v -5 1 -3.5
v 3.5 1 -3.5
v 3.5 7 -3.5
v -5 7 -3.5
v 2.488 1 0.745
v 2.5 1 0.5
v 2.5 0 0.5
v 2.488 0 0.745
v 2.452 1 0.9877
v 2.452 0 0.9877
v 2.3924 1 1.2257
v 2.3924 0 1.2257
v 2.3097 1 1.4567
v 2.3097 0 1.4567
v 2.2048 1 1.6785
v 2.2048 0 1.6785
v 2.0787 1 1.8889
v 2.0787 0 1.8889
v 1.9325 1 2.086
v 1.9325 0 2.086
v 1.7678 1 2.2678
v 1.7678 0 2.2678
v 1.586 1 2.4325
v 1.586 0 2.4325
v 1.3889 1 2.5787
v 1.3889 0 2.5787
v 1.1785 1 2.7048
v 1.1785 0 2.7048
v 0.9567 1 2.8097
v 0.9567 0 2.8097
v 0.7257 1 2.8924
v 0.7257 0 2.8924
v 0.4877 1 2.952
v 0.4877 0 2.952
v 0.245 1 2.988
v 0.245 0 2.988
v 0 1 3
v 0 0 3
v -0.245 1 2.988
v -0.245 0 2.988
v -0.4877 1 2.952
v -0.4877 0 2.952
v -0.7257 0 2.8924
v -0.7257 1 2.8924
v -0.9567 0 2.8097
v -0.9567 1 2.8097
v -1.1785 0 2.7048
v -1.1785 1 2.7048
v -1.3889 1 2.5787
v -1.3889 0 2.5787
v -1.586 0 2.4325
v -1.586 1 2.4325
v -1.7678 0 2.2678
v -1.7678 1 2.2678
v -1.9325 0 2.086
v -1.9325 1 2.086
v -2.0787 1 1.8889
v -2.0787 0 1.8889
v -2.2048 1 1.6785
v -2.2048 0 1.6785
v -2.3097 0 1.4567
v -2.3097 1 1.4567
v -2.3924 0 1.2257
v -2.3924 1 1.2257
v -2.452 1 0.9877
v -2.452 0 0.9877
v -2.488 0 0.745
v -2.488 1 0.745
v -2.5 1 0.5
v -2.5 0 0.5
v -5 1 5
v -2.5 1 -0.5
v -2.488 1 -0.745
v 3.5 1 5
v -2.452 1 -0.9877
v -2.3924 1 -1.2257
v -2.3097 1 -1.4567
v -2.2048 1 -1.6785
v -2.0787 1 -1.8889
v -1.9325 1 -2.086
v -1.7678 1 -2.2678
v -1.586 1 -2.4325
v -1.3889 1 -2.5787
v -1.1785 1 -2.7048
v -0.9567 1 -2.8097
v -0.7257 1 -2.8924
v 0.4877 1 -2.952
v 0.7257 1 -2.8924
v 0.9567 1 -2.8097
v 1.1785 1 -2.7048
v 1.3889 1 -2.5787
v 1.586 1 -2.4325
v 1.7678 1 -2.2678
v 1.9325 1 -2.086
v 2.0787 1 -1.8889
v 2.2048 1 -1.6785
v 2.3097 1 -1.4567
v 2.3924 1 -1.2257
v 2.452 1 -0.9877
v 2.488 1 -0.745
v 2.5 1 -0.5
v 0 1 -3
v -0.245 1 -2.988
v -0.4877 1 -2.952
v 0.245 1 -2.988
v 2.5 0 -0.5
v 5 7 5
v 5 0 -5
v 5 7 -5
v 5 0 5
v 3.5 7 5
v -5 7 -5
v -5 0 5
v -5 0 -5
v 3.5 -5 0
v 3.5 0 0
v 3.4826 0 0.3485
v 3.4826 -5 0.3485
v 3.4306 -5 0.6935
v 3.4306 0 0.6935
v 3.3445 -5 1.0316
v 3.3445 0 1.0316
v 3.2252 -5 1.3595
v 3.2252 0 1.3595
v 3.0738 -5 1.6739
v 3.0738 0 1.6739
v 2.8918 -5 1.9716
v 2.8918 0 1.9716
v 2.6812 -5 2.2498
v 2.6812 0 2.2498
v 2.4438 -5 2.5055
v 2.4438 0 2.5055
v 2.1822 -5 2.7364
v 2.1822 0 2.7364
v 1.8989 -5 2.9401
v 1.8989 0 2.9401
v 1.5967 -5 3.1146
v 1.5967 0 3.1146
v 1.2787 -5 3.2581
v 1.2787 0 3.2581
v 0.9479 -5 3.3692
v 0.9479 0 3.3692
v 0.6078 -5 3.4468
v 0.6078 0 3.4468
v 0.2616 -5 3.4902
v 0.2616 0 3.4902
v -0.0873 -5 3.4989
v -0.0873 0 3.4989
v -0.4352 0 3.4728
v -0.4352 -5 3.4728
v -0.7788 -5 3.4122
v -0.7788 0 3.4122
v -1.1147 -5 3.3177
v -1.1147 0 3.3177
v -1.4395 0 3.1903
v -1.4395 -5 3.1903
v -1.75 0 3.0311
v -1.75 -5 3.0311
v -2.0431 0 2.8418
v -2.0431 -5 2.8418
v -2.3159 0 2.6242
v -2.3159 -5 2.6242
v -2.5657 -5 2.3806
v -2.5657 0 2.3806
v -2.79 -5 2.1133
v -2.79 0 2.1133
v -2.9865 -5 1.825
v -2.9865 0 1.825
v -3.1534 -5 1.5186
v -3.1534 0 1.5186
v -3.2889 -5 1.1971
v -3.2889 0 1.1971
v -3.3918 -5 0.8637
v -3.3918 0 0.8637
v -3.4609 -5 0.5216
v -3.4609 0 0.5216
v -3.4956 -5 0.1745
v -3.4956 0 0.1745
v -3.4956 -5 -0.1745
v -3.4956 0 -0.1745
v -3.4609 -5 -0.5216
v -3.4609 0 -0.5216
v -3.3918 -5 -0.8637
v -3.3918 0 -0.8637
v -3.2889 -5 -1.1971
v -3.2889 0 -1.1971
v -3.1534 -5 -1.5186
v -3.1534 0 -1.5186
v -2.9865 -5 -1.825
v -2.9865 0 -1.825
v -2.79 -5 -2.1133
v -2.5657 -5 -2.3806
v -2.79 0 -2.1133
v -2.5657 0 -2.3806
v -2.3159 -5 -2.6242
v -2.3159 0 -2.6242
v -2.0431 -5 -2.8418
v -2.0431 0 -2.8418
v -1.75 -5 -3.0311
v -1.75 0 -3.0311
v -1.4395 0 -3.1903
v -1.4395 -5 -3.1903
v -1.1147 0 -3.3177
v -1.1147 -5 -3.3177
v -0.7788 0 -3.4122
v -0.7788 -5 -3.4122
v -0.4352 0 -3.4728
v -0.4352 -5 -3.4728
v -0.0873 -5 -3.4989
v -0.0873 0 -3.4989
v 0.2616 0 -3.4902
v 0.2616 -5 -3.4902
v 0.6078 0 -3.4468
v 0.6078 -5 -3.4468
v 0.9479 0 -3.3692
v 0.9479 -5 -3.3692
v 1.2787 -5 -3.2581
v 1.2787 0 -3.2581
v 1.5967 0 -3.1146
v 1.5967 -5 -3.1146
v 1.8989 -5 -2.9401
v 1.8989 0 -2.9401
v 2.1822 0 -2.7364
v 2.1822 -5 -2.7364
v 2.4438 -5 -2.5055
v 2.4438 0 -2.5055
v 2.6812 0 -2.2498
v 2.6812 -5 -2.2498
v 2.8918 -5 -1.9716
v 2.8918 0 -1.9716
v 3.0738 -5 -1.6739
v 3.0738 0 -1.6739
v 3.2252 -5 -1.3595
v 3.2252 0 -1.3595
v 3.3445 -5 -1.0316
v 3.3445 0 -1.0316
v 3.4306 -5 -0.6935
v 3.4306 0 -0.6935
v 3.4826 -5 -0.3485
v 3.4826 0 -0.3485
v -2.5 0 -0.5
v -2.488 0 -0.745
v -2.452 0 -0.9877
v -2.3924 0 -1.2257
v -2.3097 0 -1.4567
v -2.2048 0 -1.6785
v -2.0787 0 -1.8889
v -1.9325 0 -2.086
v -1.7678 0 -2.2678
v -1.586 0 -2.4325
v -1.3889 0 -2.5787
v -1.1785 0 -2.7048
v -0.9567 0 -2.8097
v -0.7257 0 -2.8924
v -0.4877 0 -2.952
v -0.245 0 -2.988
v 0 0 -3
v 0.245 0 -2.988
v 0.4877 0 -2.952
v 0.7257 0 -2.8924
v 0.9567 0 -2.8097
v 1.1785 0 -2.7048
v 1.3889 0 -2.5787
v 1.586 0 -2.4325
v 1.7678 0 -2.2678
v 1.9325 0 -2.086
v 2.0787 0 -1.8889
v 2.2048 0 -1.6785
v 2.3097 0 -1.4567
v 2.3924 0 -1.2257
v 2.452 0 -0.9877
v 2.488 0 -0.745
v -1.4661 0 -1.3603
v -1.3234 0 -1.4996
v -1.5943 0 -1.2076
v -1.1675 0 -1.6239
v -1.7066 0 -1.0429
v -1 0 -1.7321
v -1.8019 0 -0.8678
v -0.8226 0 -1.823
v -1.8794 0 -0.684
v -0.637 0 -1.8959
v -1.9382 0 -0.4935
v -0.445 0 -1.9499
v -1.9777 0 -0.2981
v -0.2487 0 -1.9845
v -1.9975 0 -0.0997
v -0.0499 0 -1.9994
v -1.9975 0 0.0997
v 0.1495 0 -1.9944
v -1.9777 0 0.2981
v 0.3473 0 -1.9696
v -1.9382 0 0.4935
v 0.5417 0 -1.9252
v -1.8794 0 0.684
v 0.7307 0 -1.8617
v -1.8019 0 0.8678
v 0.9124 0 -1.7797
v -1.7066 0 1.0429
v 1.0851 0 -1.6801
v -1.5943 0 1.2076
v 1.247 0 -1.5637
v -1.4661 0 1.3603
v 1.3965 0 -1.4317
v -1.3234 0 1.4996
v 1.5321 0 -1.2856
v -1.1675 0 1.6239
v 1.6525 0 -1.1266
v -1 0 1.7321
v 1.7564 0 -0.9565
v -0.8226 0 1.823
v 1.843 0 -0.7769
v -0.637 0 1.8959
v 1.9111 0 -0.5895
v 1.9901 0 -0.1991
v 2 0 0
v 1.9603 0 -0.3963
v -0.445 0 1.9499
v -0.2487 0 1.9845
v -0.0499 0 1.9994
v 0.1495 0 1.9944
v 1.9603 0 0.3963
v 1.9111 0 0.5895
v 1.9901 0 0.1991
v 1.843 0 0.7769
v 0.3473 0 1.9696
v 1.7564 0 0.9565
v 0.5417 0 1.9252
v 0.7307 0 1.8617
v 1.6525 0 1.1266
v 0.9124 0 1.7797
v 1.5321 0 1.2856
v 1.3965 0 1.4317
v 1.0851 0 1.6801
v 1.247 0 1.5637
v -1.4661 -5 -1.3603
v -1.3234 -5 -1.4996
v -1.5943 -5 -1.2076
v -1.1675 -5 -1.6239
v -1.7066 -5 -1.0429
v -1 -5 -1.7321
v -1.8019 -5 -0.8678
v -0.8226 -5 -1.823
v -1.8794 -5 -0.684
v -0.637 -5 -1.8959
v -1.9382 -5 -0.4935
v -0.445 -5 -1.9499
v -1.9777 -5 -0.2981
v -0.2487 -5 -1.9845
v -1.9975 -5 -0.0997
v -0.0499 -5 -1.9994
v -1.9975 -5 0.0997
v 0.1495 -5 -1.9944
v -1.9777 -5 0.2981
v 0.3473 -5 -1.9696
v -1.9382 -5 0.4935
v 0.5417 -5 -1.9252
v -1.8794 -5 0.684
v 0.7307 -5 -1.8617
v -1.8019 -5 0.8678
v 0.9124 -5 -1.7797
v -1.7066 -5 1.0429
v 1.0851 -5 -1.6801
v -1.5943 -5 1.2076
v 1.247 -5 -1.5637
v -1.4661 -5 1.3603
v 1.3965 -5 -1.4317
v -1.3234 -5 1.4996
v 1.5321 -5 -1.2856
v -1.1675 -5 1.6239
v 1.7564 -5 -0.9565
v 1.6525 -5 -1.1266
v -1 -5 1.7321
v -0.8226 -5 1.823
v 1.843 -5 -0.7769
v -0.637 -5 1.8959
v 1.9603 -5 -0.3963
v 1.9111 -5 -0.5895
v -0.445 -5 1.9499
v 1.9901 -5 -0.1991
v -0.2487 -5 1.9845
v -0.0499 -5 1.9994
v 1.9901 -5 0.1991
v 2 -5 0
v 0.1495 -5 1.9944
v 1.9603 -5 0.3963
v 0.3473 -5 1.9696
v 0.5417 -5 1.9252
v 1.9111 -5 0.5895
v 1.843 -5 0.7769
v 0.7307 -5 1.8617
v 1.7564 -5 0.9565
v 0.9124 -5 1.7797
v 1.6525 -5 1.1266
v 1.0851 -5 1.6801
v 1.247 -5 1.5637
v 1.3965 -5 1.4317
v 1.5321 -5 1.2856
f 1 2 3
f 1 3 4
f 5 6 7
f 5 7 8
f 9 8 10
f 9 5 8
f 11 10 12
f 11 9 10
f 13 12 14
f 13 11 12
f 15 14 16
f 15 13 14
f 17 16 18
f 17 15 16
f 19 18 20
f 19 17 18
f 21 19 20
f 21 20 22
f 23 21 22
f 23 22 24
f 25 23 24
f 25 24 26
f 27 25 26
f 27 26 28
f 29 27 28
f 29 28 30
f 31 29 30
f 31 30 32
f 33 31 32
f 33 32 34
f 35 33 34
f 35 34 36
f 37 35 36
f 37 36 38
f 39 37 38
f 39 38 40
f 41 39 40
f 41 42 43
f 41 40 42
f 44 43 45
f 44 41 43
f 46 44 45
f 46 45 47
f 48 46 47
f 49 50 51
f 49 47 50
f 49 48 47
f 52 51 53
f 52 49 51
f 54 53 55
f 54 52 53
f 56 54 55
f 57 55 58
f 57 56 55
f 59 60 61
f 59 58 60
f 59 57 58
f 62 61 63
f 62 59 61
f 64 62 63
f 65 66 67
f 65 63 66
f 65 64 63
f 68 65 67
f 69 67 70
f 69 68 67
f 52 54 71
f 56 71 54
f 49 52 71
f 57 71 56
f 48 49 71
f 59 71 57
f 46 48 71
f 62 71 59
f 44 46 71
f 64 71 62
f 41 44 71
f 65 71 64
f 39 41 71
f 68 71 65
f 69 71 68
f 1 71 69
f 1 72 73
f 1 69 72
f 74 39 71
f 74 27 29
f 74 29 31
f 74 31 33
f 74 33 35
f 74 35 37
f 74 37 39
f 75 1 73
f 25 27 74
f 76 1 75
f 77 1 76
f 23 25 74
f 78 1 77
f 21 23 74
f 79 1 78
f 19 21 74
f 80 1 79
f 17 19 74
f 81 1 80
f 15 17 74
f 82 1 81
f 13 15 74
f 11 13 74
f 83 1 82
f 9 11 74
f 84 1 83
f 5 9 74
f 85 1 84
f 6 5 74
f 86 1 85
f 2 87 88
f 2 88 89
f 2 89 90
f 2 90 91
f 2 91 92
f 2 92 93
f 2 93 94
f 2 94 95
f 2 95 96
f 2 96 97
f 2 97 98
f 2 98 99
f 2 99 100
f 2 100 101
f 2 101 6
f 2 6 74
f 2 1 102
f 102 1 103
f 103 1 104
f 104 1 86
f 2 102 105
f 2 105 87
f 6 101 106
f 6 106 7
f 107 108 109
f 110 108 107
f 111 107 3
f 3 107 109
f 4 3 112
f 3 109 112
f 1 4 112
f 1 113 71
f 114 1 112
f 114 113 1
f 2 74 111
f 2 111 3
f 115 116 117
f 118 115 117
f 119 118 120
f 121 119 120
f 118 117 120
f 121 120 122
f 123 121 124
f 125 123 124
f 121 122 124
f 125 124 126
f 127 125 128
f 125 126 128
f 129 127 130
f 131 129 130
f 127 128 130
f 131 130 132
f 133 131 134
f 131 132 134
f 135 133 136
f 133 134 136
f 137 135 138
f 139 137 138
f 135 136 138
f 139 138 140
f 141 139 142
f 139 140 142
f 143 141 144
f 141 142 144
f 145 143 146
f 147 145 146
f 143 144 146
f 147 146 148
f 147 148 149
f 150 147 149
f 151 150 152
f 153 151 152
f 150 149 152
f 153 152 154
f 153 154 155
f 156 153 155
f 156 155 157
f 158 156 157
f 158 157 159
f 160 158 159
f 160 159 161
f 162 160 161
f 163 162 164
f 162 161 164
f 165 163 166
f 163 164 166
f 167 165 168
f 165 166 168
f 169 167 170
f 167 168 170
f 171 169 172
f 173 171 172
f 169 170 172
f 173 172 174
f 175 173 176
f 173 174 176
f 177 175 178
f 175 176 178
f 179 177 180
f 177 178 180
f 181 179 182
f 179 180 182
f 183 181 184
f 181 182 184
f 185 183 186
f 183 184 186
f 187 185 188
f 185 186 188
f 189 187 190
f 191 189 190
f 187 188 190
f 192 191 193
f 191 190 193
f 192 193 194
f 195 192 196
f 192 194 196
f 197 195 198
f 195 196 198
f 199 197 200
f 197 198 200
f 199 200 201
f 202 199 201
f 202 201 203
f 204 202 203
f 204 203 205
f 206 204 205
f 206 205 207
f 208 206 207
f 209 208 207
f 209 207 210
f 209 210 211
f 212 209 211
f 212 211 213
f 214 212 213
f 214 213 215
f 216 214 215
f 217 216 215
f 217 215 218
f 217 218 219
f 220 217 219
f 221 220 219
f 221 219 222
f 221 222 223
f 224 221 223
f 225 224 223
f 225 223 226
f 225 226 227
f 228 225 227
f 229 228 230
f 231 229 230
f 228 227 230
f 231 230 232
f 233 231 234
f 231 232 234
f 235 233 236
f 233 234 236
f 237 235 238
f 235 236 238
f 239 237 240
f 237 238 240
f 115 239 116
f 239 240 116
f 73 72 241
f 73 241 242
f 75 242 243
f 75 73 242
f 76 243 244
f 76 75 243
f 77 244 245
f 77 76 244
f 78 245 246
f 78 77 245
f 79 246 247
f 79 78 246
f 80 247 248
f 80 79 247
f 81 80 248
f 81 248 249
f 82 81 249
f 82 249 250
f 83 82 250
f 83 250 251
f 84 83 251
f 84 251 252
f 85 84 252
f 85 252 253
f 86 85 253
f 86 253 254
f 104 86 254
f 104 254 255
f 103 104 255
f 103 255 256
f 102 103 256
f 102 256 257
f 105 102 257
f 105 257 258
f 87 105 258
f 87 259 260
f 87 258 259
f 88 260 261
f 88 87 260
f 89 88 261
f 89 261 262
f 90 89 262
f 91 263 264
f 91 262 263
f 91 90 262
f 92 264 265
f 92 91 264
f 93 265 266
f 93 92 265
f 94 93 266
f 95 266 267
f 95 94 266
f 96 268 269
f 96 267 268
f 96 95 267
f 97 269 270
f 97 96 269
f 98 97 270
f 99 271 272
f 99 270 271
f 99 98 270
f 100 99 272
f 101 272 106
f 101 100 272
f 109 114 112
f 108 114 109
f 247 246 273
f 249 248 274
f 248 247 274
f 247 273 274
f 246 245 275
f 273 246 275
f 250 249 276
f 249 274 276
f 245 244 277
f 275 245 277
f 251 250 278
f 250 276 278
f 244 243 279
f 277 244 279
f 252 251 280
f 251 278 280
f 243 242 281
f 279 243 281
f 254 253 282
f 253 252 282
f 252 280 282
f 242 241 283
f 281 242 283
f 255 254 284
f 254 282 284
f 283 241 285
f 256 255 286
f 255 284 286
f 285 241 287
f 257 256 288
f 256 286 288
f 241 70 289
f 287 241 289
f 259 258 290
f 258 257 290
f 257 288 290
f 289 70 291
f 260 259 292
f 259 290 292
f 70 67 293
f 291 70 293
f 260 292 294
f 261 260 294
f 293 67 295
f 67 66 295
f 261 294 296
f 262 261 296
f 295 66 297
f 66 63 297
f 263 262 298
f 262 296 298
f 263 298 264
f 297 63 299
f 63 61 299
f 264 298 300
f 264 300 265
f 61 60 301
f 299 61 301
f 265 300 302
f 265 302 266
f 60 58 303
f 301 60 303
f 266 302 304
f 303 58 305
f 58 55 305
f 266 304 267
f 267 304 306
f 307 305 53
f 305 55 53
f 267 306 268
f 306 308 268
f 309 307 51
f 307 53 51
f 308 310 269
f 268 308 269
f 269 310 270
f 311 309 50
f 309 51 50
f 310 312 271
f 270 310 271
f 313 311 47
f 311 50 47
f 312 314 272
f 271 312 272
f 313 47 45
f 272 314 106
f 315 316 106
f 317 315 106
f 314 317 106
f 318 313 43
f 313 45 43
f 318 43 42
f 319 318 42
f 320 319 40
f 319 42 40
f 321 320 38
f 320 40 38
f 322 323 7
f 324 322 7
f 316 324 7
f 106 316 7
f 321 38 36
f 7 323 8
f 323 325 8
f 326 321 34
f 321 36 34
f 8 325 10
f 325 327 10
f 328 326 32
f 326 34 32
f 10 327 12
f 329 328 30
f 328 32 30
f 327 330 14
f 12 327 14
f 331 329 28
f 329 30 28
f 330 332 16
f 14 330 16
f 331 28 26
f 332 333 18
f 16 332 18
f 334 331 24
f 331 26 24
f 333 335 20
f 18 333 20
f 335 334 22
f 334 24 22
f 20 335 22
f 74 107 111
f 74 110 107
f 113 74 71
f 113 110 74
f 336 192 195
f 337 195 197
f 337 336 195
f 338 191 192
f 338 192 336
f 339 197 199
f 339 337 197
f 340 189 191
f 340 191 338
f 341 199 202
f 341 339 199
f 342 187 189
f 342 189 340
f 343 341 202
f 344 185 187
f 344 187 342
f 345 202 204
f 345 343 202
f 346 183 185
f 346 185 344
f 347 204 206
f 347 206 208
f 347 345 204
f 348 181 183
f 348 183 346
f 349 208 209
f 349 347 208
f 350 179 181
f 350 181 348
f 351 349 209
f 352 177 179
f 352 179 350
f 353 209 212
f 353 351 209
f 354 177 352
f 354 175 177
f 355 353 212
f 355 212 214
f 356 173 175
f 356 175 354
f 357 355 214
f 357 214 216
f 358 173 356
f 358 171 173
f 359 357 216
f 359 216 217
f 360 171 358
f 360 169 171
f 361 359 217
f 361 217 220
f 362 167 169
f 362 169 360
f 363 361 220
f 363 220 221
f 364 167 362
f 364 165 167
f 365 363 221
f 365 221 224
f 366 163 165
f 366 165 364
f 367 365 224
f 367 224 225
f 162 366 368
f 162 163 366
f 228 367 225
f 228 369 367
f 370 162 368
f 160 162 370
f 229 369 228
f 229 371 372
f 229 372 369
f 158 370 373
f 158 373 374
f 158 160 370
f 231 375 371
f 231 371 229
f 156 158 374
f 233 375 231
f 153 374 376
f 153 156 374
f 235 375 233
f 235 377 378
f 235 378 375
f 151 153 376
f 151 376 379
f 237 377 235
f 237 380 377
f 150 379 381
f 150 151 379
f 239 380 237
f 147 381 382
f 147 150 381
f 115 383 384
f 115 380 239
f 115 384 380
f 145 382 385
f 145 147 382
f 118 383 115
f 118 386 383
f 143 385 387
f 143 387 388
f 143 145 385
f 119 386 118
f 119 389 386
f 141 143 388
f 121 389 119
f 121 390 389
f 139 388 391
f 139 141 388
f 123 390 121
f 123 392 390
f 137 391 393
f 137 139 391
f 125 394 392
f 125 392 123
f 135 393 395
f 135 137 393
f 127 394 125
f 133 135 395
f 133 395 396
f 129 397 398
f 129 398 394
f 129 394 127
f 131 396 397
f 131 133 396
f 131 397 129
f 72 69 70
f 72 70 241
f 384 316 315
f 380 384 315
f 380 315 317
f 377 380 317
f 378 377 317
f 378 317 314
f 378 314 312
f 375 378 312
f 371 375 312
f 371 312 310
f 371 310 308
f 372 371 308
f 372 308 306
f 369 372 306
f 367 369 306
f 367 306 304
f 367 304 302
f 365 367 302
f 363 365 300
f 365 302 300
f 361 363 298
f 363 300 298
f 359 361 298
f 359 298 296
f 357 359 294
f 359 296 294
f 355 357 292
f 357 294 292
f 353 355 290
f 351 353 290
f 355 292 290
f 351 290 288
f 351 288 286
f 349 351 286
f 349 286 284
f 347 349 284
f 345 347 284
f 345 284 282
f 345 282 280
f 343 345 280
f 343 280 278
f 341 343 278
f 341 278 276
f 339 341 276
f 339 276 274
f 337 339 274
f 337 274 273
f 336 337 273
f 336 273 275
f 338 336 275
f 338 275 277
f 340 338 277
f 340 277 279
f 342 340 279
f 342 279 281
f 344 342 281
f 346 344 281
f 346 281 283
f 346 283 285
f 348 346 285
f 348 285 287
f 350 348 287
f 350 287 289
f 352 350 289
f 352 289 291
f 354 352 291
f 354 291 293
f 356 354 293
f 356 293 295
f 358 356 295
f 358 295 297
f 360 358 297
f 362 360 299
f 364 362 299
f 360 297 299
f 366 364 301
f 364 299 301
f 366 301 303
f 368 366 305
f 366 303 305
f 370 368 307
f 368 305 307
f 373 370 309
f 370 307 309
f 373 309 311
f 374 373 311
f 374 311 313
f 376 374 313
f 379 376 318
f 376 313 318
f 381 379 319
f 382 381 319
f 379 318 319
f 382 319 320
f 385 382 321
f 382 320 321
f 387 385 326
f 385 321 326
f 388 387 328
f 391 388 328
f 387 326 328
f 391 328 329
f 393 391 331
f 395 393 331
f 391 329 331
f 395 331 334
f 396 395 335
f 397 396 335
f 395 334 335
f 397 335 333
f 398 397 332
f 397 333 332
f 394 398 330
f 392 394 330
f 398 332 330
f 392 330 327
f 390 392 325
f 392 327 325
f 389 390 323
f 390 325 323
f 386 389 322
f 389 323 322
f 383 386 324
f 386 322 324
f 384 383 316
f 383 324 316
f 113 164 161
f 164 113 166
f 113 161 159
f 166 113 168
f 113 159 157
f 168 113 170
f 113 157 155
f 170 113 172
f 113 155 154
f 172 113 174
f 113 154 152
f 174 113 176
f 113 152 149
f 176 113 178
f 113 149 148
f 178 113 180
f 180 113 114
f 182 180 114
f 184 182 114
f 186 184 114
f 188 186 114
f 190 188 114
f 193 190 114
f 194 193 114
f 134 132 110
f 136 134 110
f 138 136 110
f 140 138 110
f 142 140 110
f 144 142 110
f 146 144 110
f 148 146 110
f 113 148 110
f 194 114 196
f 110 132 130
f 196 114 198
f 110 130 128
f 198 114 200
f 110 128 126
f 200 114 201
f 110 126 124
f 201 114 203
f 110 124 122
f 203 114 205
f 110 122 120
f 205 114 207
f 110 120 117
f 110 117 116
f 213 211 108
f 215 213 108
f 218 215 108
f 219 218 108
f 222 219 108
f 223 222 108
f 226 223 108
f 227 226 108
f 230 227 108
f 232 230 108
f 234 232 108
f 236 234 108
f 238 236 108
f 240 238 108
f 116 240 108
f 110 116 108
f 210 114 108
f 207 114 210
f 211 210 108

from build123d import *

# Parameters (mm, degrees)
SKETCH1_W           = 10
SKETCH1_H           = 10
BOSS_EXTRUDE1_DEPTH = 1
CUT_EXTRUDE1_DEPTH  = 1.5
SKETCH3_R           = 3.5
BOSS_EXTRUDE2_DEPTH = 5
SKETCH4_R           = 2
CUT_EXTRUDE2_DEPTH  = 6
BOSS_EXTRUDE3_DEPTH = 6


with BuildPart() as part:
    # Sketch1 → Boss-Extrude1 (new body)
    with BuildSketch(Plane(origin=(0, 0, 0), x_dir=(1, 0, 0), z_dir=(0, 1, 0))):
        Rectangle(SKETCH1_W, SKETCH1_H)
    extrude(amount=BOSS_EXTRUDE1_DEPTH)

    # Sketch2 → Cut-Extrude1 (cut)
    with BuildSketch(Plane(origin=(0, 1, 0), x_dir=(1, 0, 0), z_dir=(0, 1, 0))):
        with BuildLine():
            Line((2.5, 0.5), (2.5, -0.5))
            ThreePointArc((2.5, -0.5), (0, -3), (-2.5, -0.5))
            Line((-2.5, -0.5), (-2.5, 0.5))
            ThreePointArc((-2.5, 0.5), (0, 3), (2.5, 0.5))
        make_face()
    extrude(amount=-CUT_EXTRUDE1_DEPTH, mode=Mode.SUBTRACT)

    # Sketch3 → Boss-Extrude2 (add)
    with BuildSketch(Plane.XZ):
        Circle(SKETCH3_R)
    extrude(amount=BOSS_EXTRUDE2_DEPTH)

    # Sketch4 → Cut-Extrude2 (cut, through all)
    with BuildSketch(Plane(origin=(0, 0, 0), x_dir=(1, 0, 0), z_dir=(0, 1, 0))):
        Circle(SKETCH4_R)
    extrude(amount=-CUT_EXTRUDE2_DEPTH, mode=Mode.SUBTRACT)

    # Sketch6 → Boss-Extrude3 (add)
    with BuildSketch(Plane(origin=(0, 1, 0), x_dir=(1, 0, 0), z_dir=(0, 1, 0))):
        Polygon((3.5, -5), (3.5, 3.5), (-5, 3.5), (-5, 5), (5, 5), (5, -5), align=None)
    extrude(amount=BOSS_EXTRUDE3_DEPTH)


solid = part.part
